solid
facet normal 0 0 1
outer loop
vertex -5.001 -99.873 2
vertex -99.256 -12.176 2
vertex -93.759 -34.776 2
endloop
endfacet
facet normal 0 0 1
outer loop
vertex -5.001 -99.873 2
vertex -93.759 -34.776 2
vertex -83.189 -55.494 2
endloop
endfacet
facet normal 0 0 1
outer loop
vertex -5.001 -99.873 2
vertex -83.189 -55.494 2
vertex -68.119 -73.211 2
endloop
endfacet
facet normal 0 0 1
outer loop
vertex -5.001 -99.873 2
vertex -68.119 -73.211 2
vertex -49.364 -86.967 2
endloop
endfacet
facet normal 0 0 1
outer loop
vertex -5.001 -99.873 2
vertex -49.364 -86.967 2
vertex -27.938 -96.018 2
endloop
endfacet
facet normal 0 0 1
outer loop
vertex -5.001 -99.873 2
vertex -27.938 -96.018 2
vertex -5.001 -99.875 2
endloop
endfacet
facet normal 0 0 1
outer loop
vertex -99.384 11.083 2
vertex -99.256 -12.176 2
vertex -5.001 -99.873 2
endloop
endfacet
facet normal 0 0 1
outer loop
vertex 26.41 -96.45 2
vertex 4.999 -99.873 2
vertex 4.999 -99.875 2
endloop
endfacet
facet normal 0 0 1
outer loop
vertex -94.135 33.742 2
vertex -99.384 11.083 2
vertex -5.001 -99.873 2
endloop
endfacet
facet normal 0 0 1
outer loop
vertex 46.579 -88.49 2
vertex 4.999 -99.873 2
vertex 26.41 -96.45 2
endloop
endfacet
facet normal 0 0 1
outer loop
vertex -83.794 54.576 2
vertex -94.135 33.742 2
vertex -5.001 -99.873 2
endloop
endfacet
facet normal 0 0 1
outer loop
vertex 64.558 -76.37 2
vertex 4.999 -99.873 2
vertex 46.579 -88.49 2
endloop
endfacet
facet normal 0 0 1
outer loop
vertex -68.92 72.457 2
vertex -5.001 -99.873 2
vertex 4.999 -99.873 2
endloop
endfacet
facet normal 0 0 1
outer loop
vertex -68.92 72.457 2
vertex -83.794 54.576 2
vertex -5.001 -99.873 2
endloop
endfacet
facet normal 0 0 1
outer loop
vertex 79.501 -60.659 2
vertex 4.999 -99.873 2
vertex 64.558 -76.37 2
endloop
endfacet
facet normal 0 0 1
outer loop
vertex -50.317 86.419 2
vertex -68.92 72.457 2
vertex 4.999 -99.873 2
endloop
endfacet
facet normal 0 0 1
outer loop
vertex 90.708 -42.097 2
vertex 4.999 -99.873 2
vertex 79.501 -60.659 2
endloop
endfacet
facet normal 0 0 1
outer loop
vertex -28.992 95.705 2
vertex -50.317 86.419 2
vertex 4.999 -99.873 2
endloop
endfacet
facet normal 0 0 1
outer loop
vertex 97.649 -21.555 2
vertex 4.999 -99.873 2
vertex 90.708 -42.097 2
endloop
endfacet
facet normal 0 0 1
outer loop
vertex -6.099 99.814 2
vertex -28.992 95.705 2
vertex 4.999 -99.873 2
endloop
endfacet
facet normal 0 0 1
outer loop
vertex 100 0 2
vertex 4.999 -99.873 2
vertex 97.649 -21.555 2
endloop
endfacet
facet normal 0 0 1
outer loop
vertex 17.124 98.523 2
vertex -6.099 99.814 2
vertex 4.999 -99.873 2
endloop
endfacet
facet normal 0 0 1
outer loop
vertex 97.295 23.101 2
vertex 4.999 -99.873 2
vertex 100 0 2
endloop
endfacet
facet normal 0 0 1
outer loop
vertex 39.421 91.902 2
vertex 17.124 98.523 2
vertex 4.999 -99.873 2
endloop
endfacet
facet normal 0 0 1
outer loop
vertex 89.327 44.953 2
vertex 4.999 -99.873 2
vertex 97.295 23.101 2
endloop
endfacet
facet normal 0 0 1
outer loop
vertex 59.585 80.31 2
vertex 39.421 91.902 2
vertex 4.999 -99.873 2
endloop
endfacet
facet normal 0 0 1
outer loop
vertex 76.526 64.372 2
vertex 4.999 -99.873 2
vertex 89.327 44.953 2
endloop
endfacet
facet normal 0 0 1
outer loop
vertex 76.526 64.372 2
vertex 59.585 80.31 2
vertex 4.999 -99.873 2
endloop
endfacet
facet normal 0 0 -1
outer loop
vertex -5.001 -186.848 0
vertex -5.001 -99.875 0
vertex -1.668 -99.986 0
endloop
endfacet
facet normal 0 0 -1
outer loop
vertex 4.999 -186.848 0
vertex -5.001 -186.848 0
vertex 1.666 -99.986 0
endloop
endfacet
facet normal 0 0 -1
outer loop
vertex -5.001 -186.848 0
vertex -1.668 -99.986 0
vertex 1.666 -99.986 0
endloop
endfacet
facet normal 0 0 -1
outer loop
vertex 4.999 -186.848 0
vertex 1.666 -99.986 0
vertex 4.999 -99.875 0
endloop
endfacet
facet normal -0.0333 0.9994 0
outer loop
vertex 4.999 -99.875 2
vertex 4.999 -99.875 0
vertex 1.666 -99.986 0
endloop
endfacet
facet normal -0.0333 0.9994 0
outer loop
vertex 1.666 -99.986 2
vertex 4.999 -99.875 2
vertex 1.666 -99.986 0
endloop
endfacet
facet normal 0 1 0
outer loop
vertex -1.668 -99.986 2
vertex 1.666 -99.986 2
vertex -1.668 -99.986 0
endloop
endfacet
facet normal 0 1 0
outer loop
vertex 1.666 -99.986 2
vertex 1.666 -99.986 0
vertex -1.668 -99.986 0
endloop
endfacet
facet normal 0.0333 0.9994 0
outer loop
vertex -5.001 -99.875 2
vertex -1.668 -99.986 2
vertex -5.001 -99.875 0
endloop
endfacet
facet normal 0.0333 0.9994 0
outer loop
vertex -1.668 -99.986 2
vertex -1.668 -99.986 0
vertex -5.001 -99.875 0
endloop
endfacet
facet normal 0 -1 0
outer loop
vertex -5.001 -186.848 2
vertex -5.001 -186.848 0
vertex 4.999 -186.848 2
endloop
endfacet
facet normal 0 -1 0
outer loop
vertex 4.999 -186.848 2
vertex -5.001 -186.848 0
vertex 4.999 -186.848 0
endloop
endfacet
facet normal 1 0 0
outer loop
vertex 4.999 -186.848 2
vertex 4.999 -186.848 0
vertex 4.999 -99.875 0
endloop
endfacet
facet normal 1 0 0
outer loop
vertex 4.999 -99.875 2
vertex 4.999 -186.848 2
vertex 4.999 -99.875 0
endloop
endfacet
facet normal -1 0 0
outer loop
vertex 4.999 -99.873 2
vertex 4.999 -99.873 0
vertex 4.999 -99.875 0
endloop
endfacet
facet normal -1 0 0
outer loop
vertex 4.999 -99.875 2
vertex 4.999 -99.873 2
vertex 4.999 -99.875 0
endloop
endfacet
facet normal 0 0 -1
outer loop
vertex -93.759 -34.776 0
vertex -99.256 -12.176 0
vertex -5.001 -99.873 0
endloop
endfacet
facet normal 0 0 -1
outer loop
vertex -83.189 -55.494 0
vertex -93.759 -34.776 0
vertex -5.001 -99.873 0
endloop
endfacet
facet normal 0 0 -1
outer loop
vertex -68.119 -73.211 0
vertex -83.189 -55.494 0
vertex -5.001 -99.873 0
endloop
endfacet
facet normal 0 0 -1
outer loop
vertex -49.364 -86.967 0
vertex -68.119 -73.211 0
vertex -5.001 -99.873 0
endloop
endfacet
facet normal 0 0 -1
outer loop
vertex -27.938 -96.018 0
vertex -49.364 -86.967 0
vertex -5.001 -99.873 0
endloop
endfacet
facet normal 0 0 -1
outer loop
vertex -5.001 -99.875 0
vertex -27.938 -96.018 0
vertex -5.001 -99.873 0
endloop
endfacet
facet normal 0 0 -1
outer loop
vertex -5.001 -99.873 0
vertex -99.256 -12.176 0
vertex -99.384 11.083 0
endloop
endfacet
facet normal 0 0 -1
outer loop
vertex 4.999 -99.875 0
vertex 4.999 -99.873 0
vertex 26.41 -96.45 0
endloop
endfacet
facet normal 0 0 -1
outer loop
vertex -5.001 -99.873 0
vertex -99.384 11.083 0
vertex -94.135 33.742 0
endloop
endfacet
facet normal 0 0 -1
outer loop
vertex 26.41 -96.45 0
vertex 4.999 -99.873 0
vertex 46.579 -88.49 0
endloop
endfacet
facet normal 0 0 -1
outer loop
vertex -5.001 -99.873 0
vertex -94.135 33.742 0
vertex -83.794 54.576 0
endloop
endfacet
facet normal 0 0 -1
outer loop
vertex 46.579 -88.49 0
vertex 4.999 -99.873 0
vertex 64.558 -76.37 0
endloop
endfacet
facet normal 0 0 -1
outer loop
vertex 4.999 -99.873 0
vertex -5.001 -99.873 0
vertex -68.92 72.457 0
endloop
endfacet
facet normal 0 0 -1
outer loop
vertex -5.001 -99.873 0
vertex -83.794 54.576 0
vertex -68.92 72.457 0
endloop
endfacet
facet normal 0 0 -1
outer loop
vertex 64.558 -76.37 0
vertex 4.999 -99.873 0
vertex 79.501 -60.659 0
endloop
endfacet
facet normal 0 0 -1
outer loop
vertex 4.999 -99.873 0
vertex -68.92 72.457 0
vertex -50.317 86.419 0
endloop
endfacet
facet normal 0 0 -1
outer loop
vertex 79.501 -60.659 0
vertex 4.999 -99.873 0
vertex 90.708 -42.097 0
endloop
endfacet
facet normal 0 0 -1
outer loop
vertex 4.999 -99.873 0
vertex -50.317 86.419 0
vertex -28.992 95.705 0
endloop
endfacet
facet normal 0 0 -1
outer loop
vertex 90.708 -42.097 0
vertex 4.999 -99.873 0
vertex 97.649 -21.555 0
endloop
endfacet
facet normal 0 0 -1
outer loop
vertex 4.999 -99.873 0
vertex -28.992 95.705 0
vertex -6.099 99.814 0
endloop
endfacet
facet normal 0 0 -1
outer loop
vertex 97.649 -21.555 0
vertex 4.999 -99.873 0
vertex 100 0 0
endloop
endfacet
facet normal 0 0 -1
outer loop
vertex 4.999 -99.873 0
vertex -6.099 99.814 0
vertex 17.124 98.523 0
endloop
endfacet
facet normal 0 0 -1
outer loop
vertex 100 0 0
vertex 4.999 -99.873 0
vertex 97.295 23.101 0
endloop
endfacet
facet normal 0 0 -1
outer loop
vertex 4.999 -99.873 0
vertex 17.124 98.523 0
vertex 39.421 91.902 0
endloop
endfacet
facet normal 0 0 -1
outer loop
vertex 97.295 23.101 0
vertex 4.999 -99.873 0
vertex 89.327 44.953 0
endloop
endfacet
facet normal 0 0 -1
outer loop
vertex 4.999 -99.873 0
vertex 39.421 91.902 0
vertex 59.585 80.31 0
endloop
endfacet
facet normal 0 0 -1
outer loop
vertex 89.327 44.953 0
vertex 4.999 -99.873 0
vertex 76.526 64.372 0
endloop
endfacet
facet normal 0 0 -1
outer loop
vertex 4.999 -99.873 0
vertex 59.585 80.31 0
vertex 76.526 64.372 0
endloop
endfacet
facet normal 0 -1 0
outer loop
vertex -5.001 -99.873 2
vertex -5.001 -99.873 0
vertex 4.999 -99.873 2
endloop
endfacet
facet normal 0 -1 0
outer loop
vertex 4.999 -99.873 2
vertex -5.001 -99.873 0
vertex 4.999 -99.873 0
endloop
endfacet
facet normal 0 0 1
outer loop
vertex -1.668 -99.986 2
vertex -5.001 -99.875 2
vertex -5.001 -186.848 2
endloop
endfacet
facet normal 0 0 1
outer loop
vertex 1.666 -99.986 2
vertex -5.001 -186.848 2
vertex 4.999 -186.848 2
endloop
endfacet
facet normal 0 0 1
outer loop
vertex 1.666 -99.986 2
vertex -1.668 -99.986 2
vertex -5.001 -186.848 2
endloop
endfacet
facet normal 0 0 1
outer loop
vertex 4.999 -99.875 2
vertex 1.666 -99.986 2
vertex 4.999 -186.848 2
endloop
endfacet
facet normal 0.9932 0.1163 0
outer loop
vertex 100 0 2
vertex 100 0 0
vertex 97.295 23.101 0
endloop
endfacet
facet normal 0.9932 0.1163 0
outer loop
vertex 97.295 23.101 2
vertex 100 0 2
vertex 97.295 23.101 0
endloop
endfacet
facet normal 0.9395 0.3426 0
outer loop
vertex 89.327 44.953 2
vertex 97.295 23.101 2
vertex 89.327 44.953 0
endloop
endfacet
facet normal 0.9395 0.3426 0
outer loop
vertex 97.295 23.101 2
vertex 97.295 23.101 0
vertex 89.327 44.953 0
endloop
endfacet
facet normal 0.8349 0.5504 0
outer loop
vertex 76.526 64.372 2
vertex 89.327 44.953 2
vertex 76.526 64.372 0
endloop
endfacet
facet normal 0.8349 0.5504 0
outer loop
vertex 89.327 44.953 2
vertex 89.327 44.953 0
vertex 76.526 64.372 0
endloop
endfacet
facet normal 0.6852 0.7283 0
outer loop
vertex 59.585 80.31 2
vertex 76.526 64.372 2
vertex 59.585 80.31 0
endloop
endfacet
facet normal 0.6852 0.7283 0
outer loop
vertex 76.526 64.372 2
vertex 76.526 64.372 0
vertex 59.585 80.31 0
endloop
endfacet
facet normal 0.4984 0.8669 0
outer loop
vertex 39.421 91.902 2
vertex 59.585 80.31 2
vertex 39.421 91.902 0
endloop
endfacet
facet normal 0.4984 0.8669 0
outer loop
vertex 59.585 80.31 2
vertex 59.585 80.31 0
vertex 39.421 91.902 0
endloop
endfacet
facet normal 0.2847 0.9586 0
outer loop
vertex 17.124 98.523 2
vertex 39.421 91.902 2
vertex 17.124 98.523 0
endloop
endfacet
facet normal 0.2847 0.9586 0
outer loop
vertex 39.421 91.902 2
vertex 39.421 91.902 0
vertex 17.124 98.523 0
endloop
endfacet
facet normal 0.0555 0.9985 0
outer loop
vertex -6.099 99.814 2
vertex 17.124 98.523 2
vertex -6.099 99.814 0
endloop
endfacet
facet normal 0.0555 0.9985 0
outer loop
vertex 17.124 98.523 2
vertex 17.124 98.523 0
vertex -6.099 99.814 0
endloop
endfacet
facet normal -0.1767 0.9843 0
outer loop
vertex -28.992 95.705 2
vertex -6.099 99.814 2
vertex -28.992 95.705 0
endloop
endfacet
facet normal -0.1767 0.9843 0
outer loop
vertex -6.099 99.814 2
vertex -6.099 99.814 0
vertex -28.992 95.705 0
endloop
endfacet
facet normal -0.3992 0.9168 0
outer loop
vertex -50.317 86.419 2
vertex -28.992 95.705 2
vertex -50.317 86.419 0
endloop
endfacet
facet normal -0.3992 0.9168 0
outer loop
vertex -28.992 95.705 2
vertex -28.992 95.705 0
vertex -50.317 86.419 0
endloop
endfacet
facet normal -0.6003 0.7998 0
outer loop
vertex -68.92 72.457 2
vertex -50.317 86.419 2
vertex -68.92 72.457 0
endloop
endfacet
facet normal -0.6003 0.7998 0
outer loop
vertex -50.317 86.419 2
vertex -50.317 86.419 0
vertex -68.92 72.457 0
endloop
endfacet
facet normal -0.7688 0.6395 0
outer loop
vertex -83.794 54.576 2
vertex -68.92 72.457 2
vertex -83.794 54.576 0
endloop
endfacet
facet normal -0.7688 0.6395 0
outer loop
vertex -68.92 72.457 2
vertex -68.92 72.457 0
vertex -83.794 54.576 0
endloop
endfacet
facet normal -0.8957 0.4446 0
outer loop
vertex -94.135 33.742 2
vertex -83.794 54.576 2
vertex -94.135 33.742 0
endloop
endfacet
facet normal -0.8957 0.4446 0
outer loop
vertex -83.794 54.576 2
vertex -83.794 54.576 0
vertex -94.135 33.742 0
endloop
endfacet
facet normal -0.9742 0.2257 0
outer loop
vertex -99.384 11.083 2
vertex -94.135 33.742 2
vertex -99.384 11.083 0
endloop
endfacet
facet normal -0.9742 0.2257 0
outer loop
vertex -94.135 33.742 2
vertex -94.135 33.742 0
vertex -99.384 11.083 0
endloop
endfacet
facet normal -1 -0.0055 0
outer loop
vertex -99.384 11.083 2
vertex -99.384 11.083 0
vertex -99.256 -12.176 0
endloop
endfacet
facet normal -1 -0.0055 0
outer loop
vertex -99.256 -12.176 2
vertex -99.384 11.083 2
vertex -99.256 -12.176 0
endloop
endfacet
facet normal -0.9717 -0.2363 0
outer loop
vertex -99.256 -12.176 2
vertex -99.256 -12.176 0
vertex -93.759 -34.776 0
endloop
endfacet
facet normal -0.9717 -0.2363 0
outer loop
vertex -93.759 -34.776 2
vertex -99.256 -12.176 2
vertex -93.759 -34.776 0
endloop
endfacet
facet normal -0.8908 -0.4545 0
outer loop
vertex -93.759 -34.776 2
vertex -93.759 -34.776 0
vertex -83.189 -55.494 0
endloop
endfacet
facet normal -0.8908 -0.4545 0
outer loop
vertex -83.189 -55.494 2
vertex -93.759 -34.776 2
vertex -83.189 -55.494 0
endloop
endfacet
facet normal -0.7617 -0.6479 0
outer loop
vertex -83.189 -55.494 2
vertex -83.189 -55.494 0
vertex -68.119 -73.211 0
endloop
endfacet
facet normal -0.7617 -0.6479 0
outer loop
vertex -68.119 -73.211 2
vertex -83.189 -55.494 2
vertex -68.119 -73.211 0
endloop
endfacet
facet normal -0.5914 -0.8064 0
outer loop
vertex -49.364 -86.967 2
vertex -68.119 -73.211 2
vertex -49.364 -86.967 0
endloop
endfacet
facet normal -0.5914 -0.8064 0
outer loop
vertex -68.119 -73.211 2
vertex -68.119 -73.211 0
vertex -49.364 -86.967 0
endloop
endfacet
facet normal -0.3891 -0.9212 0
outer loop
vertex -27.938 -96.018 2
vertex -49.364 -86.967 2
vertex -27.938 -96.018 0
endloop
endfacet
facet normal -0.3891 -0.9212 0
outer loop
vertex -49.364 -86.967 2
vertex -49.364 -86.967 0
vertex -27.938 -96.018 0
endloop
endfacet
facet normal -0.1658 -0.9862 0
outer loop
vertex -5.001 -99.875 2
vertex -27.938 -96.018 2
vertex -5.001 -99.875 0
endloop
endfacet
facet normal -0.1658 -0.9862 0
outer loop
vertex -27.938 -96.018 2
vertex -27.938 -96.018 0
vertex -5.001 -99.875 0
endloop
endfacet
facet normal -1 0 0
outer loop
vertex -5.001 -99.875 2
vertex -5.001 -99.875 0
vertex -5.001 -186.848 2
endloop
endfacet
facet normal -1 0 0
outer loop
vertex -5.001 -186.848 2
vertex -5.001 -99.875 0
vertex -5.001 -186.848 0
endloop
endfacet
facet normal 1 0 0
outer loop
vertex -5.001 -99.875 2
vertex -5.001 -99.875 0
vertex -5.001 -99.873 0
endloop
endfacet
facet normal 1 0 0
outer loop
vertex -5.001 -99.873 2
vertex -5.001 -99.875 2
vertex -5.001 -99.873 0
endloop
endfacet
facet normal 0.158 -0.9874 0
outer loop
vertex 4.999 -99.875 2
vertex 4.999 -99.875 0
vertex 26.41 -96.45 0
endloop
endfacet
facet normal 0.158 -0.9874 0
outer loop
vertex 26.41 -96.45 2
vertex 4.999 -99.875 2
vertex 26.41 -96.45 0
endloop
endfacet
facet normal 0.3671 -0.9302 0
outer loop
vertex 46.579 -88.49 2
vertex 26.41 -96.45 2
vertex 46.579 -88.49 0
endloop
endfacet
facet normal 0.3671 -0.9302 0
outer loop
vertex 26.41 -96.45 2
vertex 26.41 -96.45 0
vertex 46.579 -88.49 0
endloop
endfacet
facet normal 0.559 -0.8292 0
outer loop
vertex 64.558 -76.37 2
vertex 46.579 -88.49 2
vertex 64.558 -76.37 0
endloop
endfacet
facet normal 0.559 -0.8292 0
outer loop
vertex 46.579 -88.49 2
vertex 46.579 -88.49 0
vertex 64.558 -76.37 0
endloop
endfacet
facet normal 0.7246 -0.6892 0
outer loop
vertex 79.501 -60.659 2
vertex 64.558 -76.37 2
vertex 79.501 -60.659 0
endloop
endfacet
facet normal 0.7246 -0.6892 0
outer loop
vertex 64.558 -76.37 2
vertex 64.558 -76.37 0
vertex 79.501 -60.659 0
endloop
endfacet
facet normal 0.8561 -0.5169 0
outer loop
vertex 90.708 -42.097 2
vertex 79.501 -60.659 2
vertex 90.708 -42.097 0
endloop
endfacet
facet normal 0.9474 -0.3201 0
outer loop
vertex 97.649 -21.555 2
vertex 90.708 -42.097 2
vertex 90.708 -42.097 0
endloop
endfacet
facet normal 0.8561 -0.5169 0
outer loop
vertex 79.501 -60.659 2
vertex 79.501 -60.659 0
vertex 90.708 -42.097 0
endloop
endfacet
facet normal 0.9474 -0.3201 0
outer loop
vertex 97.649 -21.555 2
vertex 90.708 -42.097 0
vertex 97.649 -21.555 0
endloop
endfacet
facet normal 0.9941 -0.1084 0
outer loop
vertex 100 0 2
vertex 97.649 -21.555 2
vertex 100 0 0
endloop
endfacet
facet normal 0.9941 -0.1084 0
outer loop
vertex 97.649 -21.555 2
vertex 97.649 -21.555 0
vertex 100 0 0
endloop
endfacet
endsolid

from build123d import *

# Parameters (mm, degrees)
EXTRUDE_2_DEPTH   = 2
EXTRUDE_2_2_DEPTH = 2


with BuildPart() as part:
    # 草图1 → 凸台-拉伸2 (new body)
    with BuildSketch(Plane.XY):
        with BuildLine():
            ThreePointArc((4.999120694, -99.874965794), (-0.000880407, -99.999999996), (-5.000879306, -99.874877753))
            Line((-5.000879306, -99.874877753), (-5.000879306, -186.847638142))
            Line((-5.000879306, -186.847638142), (4.999120694, -186.847638142))
            Line((4.999120694, -186.847638142), (4.999120694, -99.874965794))
        make_face()
    extrude(amount=EXTRUDE_2_DEPTH)


with BuildPart() as body_2:
    # 草图1 → Extrude 2 2 (new body)
    with BuildSketch(Plane.XY):
        with BuildLine():
            Line((-5.000879306, -99.874877753), (-5.000879306, -99.872723805))
            Line((-5.000879306, -99.872723805), (4.999120694, -99.872723805))
            Line((4.999120694, -99.872723805), (4.999120694, -99.874965794))
            ThreePointArc((4.999120694, -99.874965794), (72.456580341, -68.920562718), (100, 0))
            ThreePointArc((100, 0), (-68.919924802, 72.45718712), (-5.000879306, -99.874877753))
        make_face()
    extrude(amount=EXTRUDE_2_2_DEPTH)


solid = Compound([part.part, body_2.part])
